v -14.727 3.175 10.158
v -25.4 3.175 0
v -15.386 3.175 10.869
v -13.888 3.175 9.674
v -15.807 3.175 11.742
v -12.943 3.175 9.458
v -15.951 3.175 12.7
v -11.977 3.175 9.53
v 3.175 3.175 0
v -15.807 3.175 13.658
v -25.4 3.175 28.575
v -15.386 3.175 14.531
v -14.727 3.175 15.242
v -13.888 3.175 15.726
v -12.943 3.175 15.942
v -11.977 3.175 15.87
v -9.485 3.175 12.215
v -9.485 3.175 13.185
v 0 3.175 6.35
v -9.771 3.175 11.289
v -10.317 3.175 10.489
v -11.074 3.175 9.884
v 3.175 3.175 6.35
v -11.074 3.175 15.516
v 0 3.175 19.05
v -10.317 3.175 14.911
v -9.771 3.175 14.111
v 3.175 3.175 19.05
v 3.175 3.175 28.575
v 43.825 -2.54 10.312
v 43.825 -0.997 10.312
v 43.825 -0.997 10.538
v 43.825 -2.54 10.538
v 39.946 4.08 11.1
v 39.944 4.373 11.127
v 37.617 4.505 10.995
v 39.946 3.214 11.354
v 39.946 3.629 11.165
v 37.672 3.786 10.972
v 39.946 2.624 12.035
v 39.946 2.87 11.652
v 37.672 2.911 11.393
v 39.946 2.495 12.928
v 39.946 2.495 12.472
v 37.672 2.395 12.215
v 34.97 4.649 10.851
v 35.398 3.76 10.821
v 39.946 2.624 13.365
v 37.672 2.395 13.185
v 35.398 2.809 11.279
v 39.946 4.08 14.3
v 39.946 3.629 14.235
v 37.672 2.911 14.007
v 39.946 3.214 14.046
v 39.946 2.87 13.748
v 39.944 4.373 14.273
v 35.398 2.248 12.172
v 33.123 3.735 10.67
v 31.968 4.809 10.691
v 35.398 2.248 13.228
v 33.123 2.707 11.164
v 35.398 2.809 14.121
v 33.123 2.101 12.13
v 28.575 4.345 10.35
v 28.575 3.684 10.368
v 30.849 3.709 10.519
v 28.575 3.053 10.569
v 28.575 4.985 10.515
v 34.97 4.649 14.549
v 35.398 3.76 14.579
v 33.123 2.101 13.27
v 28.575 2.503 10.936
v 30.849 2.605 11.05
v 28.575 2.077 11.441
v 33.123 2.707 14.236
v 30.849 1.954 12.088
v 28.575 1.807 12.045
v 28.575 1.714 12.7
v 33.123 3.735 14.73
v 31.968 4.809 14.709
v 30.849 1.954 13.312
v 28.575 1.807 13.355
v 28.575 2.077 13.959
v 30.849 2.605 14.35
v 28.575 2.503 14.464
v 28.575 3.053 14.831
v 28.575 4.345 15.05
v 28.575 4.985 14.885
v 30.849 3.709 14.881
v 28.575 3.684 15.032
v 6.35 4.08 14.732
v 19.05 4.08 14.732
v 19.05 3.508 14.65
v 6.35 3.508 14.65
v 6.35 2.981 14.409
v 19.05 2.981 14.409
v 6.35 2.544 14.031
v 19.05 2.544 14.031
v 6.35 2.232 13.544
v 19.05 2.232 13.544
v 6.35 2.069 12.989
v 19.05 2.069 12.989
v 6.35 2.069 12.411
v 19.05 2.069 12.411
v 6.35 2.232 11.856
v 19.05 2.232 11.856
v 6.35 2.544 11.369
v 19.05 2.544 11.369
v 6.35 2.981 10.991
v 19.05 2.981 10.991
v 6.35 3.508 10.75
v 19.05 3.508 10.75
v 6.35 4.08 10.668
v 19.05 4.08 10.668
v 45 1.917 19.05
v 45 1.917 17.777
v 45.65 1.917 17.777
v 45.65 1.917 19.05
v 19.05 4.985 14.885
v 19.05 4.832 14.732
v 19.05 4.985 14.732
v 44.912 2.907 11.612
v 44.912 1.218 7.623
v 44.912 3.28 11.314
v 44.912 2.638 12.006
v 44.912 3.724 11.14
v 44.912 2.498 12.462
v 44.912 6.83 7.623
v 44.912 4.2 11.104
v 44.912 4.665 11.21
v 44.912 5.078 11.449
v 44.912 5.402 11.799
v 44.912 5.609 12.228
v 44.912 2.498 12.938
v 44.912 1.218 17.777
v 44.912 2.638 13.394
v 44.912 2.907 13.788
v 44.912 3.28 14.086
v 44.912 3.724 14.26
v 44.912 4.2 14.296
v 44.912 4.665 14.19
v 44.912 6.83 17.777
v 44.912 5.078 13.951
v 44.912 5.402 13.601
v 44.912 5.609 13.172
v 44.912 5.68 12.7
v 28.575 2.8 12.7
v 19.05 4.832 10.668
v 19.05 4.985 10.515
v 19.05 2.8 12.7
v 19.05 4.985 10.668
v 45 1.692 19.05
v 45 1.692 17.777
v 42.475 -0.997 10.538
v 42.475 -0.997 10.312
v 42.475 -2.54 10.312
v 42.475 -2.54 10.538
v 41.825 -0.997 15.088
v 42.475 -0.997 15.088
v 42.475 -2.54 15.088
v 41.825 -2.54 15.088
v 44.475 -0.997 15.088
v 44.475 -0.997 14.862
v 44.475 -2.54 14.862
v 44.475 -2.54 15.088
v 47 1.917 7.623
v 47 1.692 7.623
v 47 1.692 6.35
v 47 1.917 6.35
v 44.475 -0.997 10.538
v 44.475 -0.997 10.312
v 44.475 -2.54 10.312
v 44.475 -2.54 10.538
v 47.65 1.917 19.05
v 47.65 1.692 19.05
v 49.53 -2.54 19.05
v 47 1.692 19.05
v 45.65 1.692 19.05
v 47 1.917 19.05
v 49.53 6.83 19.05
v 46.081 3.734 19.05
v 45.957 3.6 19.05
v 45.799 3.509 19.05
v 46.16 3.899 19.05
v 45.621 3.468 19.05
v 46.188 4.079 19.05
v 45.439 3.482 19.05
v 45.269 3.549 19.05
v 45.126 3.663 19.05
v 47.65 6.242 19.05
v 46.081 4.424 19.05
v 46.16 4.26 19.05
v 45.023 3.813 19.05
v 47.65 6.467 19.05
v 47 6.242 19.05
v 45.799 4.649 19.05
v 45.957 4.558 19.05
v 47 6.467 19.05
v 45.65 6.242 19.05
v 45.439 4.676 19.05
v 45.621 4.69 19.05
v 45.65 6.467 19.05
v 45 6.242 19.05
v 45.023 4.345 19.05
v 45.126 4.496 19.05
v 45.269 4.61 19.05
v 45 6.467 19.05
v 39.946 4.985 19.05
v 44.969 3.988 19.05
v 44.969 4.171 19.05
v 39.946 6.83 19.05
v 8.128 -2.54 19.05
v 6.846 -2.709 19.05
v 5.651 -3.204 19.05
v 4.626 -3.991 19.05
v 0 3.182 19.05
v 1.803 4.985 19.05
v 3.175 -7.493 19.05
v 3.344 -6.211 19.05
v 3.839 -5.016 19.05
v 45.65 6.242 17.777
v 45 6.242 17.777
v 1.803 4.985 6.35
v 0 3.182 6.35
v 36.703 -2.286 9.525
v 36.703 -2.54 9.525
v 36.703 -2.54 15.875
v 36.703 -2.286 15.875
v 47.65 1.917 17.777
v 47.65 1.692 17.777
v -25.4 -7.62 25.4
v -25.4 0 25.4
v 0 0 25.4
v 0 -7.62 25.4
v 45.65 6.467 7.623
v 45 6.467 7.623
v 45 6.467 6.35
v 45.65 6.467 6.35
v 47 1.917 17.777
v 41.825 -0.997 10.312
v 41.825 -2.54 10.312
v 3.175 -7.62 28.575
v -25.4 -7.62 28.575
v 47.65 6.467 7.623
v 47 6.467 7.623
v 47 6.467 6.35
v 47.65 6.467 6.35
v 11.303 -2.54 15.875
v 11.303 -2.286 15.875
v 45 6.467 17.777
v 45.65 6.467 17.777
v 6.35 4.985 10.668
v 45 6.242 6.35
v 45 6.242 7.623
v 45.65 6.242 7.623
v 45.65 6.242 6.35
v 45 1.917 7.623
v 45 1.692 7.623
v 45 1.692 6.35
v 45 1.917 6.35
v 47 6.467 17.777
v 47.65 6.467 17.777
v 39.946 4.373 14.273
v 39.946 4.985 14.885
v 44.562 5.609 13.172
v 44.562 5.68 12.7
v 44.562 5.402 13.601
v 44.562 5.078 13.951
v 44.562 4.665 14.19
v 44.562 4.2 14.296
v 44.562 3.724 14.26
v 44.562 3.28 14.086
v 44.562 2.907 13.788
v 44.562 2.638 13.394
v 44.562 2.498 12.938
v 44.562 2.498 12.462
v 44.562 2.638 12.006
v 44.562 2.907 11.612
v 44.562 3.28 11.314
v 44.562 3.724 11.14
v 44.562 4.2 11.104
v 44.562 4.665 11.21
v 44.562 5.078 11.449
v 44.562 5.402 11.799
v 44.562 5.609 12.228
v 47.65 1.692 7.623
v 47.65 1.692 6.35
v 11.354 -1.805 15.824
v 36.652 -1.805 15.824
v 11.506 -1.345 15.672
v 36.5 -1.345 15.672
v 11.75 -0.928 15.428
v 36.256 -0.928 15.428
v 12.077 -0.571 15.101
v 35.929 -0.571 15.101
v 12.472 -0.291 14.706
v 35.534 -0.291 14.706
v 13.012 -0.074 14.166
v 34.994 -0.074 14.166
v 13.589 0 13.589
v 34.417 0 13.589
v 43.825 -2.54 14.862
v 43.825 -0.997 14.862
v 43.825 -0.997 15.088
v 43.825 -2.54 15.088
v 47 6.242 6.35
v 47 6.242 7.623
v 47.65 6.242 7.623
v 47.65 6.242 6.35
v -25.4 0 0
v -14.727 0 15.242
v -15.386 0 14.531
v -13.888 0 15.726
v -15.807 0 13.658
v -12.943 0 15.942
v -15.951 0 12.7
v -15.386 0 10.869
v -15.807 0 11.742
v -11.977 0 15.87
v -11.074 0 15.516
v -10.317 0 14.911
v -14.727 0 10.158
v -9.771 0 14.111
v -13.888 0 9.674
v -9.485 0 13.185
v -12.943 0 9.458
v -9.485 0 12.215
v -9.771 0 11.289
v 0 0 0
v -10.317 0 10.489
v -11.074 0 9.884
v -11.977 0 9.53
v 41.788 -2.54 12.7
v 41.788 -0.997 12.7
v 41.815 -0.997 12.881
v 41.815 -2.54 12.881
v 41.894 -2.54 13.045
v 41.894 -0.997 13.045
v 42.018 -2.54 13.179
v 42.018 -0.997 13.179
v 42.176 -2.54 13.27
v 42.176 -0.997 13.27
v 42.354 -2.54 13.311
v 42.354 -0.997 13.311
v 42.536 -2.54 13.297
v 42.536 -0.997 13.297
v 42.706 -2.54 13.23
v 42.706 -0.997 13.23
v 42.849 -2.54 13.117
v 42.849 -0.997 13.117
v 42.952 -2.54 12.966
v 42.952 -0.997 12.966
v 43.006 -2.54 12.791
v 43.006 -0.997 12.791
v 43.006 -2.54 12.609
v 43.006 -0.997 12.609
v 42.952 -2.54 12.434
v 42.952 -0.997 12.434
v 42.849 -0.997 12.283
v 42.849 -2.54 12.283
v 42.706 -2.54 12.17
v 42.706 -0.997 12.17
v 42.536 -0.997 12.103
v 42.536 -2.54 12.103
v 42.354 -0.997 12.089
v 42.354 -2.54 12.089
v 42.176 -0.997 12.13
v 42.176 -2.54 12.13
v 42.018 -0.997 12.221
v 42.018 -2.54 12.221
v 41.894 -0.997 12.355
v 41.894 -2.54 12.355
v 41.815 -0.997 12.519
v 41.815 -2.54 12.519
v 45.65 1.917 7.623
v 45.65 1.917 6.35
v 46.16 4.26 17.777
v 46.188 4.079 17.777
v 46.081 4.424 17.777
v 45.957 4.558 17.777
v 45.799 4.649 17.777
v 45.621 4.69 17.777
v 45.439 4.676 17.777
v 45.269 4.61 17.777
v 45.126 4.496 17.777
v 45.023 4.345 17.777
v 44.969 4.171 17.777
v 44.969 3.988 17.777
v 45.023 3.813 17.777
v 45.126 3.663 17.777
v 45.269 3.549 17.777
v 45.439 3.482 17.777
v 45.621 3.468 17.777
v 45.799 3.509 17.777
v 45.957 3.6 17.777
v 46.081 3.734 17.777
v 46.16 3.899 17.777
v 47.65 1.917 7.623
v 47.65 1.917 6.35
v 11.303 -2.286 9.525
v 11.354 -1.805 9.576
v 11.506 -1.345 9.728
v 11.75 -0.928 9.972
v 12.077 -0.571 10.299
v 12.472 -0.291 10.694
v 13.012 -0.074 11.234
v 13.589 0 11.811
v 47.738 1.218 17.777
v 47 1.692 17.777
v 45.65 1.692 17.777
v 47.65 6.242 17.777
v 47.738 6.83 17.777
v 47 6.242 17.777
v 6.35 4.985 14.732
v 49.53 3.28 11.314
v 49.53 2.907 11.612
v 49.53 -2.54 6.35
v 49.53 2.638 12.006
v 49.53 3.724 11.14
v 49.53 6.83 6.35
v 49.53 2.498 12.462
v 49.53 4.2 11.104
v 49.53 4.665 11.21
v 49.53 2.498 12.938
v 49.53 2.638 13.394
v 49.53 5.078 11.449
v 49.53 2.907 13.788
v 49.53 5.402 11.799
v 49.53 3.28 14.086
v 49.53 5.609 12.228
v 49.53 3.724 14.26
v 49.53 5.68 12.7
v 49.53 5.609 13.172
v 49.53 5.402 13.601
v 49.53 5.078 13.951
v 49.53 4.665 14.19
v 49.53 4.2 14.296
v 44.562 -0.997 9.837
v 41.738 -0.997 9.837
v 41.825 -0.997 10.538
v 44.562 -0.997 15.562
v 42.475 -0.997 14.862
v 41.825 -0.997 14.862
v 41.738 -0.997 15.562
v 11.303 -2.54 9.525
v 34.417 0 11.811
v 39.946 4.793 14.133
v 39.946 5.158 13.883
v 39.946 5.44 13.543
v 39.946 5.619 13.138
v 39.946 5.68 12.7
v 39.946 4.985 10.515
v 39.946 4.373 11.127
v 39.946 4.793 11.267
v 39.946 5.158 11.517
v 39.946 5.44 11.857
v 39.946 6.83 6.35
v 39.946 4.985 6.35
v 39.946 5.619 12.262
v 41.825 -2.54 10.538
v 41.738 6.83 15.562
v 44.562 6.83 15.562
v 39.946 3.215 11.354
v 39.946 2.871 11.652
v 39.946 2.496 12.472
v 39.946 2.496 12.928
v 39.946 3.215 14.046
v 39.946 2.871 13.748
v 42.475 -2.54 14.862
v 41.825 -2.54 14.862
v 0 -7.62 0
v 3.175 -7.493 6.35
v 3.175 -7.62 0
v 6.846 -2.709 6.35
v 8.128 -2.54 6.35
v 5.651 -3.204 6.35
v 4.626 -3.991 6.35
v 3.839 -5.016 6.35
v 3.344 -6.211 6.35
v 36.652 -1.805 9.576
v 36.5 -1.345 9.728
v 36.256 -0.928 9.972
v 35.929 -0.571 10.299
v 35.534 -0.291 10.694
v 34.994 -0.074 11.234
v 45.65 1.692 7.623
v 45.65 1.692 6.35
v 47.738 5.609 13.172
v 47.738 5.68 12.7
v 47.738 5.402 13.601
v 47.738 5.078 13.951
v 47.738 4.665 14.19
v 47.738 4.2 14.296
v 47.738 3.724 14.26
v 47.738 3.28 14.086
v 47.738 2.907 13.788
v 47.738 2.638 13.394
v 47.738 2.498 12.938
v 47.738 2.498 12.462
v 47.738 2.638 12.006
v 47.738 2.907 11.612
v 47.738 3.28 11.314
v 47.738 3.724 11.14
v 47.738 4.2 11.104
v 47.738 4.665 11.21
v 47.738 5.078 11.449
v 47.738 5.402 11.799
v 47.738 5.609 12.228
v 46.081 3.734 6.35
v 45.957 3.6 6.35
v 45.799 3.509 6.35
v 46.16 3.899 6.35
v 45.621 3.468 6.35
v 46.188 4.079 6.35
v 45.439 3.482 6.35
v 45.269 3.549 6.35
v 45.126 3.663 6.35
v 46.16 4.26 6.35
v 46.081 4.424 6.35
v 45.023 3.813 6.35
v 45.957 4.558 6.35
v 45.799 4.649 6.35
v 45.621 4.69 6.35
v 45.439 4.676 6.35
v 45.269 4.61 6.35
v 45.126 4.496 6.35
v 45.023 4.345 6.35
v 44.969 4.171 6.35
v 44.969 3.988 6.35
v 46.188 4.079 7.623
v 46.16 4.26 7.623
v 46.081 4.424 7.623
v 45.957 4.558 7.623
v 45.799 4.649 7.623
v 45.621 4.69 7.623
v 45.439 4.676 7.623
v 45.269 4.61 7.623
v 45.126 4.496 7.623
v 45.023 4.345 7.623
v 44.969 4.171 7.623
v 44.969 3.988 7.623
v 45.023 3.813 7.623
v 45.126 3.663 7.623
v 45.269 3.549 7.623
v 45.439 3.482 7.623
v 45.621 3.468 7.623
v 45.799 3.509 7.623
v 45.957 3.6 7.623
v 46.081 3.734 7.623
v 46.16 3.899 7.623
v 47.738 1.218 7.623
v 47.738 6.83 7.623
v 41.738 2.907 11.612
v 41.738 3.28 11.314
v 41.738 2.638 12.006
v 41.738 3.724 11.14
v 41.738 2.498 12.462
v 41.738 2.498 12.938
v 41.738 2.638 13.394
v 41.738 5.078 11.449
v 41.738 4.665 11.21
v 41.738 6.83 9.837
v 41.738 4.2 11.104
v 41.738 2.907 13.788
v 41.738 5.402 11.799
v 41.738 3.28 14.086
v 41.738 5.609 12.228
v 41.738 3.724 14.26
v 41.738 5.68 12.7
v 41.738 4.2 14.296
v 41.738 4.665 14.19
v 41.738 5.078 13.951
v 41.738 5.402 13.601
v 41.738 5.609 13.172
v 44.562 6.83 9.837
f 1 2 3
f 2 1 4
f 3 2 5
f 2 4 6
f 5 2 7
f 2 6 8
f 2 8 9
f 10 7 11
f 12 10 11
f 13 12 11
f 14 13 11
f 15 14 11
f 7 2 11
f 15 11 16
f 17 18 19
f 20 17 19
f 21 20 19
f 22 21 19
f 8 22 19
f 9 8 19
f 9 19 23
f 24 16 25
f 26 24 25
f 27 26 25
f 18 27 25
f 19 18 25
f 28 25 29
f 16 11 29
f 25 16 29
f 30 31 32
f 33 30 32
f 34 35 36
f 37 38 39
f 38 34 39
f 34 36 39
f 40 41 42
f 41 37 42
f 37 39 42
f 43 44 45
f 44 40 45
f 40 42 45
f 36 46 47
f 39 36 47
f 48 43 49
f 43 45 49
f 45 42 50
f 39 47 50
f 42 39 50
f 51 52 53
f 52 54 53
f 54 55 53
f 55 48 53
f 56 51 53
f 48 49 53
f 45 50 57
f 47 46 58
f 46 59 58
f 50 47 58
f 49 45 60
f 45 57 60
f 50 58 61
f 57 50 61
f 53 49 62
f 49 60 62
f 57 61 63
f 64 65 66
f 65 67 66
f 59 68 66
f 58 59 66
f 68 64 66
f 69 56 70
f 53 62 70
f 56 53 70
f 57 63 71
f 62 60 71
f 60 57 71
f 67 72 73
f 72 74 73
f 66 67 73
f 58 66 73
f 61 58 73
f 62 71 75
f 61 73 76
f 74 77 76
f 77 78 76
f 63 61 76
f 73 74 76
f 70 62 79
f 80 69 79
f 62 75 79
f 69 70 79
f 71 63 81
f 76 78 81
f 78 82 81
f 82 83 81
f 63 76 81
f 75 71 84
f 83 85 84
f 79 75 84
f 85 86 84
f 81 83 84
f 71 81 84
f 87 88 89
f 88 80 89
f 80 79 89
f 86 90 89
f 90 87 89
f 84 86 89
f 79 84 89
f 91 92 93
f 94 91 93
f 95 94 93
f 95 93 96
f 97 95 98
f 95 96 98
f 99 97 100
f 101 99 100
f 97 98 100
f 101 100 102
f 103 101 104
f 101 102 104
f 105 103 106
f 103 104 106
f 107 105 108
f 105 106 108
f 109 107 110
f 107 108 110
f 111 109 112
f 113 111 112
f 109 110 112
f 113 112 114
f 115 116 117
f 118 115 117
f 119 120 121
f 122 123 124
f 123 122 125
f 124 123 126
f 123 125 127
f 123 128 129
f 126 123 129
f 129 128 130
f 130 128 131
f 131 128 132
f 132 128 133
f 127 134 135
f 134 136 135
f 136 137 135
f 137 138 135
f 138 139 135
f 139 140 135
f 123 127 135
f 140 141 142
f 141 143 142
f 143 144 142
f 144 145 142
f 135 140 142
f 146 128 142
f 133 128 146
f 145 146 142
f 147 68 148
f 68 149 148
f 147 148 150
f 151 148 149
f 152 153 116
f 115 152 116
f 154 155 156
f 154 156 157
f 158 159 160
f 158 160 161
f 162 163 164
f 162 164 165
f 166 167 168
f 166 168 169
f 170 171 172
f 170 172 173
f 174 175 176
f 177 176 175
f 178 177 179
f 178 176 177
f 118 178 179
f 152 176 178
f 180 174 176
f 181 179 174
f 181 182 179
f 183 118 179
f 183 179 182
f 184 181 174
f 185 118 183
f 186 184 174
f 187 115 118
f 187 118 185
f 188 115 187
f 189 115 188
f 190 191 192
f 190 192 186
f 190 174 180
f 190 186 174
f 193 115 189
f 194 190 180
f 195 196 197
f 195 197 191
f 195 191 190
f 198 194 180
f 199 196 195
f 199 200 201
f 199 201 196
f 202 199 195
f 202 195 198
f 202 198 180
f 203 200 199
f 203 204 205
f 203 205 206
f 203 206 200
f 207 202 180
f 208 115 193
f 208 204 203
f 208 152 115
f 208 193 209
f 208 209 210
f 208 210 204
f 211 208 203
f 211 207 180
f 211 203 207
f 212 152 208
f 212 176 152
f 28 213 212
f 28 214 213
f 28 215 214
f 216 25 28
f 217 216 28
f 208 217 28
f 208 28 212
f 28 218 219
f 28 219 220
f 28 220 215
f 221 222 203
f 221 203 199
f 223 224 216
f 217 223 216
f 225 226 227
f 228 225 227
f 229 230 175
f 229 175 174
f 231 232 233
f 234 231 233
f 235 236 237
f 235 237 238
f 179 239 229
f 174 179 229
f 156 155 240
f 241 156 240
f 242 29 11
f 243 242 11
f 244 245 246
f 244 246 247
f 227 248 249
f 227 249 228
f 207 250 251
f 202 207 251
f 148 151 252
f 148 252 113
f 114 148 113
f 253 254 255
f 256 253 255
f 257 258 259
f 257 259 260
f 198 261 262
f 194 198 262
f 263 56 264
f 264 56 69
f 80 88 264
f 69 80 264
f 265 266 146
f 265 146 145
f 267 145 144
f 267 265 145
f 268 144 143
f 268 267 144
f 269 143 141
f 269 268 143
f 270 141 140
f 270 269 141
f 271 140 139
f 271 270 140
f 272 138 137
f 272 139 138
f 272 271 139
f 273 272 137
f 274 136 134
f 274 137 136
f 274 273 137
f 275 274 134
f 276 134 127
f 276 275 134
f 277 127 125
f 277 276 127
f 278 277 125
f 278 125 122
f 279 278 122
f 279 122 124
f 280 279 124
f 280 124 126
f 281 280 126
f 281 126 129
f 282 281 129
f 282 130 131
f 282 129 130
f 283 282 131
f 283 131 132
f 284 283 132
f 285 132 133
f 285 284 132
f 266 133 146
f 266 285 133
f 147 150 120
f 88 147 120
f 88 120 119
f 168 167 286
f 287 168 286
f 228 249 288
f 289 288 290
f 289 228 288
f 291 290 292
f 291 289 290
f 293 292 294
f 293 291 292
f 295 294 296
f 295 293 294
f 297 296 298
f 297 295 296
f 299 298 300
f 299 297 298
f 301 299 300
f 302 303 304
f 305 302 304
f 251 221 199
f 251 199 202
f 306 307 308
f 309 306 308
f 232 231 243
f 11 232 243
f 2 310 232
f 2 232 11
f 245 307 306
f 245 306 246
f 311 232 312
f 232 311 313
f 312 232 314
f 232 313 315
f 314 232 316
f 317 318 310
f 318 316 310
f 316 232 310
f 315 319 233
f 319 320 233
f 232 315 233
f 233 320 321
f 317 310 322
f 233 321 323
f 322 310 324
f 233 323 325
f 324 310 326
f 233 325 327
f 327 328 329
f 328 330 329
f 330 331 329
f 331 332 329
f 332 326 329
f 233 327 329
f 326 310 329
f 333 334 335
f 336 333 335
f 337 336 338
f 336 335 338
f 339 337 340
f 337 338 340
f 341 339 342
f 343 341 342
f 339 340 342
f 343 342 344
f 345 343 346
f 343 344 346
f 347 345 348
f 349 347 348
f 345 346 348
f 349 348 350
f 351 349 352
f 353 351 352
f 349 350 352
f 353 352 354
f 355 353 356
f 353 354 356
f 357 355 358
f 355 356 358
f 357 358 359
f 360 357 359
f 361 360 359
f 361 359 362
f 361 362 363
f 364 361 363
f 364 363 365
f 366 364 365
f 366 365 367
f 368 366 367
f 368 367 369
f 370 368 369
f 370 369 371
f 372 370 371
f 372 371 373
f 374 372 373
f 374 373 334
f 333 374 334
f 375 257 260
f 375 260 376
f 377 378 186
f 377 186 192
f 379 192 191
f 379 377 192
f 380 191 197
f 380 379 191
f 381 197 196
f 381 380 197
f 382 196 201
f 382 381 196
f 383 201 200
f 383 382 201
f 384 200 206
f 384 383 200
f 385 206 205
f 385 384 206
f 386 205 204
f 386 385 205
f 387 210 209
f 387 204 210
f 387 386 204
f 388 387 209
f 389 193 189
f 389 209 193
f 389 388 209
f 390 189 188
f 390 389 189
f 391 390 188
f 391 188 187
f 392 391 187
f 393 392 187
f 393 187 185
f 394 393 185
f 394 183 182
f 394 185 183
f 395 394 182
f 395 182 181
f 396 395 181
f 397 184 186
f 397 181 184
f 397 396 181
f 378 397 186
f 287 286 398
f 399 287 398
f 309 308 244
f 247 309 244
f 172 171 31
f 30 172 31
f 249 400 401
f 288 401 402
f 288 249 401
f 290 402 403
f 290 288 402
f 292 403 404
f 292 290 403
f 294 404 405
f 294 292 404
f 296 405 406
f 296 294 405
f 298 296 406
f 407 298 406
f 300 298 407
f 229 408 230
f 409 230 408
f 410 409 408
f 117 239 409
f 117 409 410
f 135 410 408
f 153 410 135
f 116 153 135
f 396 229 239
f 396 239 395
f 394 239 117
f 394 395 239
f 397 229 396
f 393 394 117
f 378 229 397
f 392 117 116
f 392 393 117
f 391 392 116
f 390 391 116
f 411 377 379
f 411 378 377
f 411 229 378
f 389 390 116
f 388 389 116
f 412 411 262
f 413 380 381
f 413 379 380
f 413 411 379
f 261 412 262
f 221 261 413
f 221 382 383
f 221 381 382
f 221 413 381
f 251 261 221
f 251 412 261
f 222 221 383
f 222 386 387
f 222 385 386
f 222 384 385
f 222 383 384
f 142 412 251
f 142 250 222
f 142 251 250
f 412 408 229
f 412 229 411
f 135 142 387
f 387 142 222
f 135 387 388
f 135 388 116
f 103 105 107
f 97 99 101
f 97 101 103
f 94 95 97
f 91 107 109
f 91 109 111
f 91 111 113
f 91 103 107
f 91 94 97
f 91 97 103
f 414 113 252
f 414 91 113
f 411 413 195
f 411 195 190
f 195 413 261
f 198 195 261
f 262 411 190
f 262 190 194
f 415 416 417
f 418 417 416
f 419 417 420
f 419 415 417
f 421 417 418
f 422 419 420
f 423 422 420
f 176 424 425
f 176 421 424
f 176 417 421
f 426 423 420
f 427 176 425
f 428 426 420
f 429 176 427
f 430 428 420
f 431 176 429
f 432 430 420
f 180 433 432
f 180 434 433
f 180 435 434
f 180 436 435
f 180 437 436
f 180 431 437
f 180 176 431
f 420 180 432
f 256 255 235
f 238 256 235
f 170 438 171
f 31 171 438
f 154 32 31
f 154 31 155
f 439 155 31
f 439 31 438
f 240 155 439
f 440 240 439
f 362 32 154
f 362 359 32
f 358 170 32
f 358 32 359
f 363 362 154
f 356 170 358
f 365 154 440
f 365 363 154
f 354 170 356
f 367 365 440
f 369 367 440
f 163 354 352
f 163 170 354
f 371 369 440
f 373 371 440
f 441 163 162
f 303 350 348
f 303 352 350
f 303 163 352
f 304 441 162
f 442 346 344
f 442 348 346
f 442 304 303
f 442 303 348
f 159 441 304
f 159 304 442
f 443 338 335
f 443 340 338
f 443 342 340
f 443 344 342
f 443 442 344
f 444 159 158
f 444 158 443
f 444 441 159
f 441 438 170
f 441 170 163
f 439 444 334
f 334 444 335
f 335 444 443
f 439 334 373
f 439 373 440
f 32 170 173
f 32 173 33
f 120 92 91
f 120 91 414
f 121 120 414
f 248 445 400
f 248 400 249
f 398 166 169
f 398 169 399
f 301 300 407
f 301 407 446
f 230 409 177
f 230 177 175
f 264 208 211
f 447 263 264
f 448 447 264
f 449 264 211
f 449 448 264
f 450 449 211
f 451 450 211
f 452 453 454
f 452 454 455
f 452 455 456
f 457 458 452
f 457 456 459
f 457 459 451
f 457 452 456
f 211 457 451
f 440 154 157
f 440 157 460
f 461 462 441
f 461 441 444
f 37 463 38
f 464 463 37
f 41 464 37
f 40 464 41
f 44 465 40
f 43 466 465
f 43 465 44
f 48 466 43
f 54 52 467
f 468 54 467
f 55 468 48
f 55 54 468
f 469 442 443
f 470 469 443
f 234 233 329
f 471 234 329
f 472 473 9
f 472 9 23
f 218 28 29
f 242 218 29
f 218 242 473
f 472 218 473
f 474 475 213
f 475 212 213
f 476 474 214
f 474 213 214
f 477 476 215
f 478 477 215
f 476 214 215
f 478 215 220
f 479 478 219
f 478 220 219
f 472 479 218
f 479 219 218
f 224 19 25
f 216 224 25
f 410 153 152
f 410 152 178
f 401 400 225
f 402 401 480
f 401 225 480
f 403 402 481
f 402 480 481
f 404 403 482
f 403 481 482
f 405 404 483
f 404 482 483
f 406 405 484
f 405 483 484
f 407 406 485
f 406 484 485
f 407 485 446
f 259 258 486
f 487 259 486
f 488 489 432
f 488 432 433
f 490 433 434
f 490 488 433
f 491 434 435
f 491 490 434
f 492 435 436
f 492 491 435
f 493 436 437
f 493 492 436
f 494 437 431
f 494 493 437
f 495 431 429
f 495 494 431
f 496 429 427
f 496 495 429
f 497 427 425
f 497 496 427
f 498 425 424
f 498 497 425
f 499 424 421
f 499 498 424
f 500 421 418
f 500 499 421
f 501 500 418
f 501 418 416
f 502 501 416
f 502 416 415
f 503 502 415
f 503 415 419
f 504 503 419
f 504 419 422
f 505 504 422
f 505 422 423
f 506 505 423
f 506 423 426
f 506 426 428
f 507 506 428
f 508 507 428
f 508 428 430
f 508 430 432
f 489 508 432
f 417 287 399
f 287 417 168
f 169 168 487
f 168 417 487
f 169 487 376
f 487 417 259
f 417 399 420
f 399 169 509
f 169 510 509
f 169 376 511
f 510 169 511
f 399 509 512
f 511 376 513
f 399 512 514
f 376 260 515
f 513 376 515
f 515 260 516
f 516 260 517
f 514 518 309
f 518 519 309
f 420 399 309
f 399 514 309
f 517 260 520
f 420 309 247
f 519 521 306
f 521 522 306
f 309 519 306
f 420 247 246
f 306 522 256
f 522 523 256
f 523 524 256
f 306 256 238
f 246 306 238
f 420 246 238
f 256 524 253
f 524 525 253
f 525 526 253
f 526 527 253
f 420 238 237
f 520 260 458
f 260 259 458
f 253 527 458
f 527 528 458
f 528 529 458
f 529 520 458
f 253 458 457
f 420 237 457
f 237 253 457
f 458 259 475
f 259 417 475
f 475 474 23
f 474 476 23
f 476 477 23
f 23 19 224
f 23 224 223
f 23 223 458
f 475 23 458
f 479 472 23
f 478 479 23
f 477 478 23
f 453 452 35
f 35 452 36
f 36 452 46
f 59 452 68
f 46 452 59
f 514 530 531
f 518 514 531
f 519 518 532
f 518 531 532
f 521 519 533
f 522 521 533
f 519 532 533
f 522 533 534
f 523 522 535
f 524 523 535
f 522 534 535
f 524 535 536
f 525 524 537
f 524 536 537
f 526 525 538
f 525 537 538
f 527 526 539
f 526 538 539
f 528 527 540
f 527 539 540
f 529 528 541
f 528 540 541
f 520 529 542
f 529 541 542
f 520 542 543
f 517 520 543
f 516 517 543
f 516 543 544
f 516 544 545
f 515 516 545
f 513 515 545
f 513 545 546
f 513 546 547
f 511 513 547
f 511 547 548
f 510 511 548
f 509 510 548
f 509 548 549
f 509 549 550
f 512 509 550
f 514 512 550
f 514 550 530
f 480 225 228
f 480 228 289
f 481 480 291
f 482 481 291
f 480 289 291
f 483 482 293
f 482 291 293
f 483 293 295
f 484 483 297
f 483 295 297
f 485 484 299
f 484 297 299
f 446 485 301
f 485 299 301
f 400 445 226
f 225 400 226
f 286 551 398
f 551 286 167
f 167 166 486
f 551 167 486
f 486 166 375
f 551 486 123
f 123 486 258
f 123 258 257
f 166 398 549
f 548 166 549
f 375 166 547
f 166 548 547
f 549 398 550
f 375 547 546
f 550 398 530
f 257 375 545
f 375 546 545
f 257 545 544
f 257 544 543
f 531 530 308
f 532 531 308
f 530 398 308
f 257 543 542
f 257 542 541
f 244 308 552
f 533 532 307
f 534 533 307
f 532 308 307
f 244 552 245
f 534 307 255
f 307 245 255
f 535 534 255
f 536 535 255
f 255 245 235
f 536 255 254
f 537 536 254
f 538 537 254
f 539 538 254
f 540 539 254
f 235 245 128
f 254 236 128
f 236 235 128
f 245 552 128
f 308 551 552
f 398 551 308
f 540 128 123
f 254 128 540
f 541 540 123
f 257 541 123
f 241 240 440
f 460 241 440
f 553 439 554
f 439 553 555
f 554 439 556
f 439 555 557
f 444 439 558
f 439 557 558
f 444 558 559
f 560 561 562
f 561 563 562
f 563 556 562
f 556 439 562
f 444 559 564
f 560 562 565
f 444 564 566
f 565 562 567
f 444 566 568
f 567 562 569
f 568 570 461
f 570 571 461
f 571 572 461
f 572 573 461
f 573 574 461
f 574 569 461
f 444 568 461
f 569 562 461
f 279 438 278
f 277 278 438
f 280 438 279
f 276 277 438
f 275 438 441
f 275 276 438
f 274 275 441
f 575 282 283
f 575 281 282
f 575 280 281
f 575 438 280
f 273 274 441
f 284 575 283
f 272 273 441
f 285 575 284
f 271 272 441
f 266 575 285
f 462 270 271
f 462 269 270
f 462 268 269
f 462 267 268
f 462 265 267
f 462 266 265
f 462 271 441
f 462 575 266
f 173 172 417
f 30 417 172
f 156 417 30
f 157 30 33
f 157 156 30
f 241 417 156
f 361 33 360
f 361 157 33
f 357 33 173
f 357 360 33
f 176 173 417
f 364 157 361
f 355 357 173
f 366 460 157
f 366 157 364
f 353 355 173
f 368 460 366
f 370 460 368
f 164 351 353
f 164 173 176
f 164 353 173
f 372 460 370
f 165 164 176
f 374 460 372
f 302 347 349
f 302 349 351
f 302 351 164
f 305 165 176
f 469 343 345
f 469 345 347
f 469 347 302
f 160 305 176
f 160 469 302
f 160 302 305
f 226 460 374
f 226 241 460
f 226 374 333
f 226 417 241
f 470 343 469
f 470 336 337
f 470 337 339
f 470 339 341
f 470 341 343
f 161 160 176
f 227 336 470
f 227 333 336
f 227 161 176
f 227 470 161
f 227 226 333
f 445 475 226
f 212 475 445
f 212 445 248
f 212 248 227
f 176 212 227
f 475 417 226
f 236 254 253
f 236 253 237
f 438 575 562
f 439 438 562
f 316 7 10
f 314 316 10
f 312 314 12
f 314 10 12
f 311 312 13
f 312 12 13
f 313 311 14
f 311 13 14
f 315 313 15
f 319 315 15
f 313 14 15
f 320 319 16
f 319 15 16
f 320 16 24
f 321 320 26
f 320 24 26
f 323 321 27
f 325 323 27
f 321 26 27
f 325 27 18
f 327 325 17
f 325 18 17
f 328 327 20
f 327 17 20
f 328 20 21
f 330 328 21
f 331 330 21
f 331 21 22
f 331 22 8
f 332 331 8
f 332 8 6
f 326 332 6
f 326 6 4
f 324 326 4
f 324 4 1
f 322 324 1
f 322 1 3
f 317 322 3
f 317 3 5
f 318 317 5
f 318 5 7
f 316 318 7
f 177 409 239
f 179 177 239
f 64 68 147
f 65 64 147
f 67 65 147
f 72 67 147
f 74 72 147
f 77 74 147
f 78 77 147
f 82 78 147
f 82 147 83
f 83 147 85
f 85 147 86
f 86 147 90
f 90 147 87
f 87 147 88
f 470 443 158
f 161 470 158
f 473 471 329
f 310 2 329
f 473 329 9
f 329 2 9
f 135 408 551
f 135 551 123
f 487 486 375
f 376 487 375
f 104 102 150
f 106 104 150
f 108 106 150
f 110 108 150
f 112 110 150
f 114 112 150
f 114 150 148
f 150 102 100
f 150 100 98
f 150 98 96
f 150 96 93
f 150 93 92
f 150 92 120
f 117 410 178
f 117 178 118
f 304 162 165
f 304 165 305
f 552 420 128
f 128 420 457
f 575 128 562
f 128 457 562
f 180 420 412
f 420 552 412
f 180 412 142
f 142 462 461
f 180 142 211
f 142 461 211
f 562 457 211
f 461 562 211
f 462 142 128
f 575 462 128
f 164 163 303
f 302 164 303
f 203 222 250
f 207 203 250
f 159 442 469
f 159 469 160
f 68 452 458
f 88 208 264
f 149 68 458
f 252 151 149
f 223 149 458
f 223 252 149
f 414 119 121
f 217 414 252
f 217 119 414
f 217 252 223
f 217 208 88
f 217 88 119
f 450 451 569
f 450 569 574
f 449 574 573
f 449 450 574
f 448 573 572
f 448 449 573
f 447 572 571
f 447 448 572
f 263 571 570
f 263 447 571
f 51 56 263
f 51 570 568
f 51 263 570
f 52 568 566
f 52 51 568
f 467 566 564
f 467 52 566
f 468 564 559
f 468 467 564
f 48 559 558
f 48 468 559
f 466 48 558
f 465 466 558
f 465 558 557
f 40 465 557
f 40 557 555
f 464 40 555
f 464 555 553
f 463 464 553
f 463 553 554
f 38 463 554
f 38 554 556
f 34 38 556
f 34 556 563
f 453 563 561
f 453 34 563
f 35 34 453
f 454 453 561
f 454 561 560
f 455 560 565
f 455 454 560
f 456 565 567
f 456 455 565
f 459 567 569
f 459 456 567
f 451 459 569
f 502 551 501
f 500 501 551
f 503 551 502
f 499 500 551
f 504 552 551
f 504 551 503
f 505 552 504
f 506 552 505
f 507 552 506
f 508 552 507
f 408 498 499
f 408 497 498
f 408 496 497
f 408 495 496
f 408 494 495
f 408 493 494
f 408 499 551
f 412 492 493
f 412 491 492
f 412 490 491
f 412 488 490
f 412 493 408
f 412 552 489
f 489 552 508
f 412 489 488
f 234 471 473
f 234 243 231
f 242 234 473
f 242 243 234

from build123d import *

# Parameters (mm, degrees)
SKETCH_W             = 25.4
SKETCH_H             = 3.175
PAD_DEPTH            = 25.4
SKETCH001_W          = 28.575
SKETCH001_H          = 12.7
PAD001_DEPTH         = 1.81
PAD001_DEPTH_BACK    = 5.715
POCKET_DEPTH         = 9.525
POCKET001_DEPTH      = 12.7
CHAMFER_SIZE         = 1.8034
SKETCH004_R          = 3.2512
POCKET002_DEPTH      = 5.716
PAD002_DEPTH         = 10.795
FILLET_R             = 4.953
SKETCH013_W          = 9.37
SKETCH013_H          = 12.7
SKETCH013_R          = 1.6002
PAD008_DEPTH         = 20.955
POCKET003_DEPTH      = 11.3711
SKETCH014_W          = 2.825
SKETCH014_H          = 10.1538
POCKET004_DEPTH      = 5.6125
SKETCH015_W          = 2.825
SKETCH015_H          = 5.725
POCKET005_DEPTH      = 7.8269
SKETCH016_R          = 0.6125
SKETCH016_W          = 0.65
SKETCH016_H          = 0.225
POCKET006_DEPTH      = 6.6241
SKETCH017_R          = 0.6125
SKETCH017_W          = 0.65
SKETCH017_H          = 0.225
POCKET007_DEPTH      = 7.6241
POCKET007_DEPTH_BACK = 20.9529
SKETCH018_R          = 1.6002
SKETCH019_R          = 2.36517
SKETCH020_W          = 25.4
SKETCH020_H          = 6.35
POCKET008_DEPTH      = 2.54
FILLET001_R          = 2.286


with BuildPart() as part:
    # Sketch → Pad (new body)
    with BuildSketch(Plane.XY):
        with Locations((-12.7, 1.5875)):
            Rectangle(SKETCH_W, SKETCH_H)
    extrude(amount=PAD_DEPTH)

    # Sketch001 (on Face1 of Pad) → Pad001 (join, two sides)
    with BuildSketch(Plane(origin=(0, 3.175, 0), x_dir=(-1, 0, 0), z_dir=(0, 1, 0))) as pad001_sk:
        with Locations((-14.2875, 12.7)):
            Rectangle(SKETCH001_W, SKETCH001_H)
    extrude(amount=PAD001_DEPTH)
    extrude(pad001_sk.sketch, amount=-PAD001_DEPTH_BACK)

    # Sketch002 (on Face13 of Pad001) → Pocket (cut)
    with BuildSketch(Plane.YZ.offset(28.575)):
        Polygon((9.150137, 19.05), (2.800137, 12.7), (9.150137, 6.35), align=None)
    extrude(amount=-POCKET_DEPTH, mode=Mode.SUBTRACT)

    # Sketch003 (on Face16 of Pocket) → Pocket001 (cut)
    with BuildSketch(Plane.YZ.offset(19.05)):
        with BuildLine():
            ThreePointArc((4.08, 14.732), (2.048, 12.7), (4.08, 10.668))
            Line((4.985, 10.668), (4.08, 10.668))
            Line((4.985, 14.732), (4.985, 10.668))
            Line((4.08, 14.732), (4.985, 14.732))
        make_face()
    extrude(amount=-POCKET001_DEPTH, mode=Mode.SUBTRACT)

    # Chamfer
    chamfer_edges = [part.edges().sort_by_distance(p)[0] for p in [
        (0, 4.985, 12.7),
    ]]
    chamfer(chamfer_edges, length=CHAMFER_SIZE)

    # Sketch004 (on Face4 of Chamfer) → Pocket002 (cut, through all)
    with BuildSketch(Plane(origin=(0, 3.175, 0), x_dir=(-1, 0, 0), z_dir=(0, 1, 0))):
        with Locations((12.7, 12.7)):
            Circle(SKETCH004_R)
    extrude(amount=-POCKET002_DEPTH, mode=Mode.SUBTRACT)

    # Sketch006 (on Face4 of Pocket002) → Pad002 (join)
    with BuildSketch(Plane(origin=(0, 3.175, 0), x_dir=(-1, 0, 0), z_dir=(0, 1, 0))):
        Polygon((0, 0), (-3.175, 0), (-3.175, 28.575), (25.4, 28.575), (25.4, 25.4), (0, 25.4), align=None)
    extrude(amount=-PAD002_DEPTH)

    # Fillet
    fillet_edges = [part.edges().sort_by_distance(p)[0] for p in [
        (3.175, -2.54, 12.7),
    ]]
    fillet(fillet_edges, radius=FILLET_R)

    # Sketch013 (on Face4 of Fillet) → Pad008 (join)
    with BuildSketch(Plane.YZ.offset(28.575)):
        with Locations((2.145, 12.7)):
            Rectangle(SKETCH013_W, SKETCH013_H)
        with Locations((4.08, 12.7)):
            Circle(SKETCH013_R, mode=Mode.SUBTRACT)
    extrude(amount=PAD008_DEPTH)

    # Pad008 Face13 → Pocket003 (cut)
    with BuildSketch(Plane(origin=(28.575, 5.919165, 12.7), x_dir=(0, 1, 0), z_dir=(-1, 0, 0))):
        with BuildLine():
            Line((-0.934165, -2.184863), (-0.934165, -6.35))
            Line((-0.934165, -6.35), (0.910835, -6.35))
            Line((0.910835, -6.35), (0.910835, 6.35))
            Line((0.910835, 6.35), (-0.934165, 6.35))
            Line((-0.934165, 6.35), (-0.934165, 2.184863))
            Line((-0.934165, 2.184863), (-1.545926, 1.573102))
            ThreePointArc((-1.545926, 1.573102), (-0.608336, 1.022594), (-0.238965, 0))
            ThreePointArc((-0.238965, 0), (-0.608336, -1.022594), (-1.545926, -1.573102))
            Line((-1.545926, -1.573102), (-0.934165, -2.184863))
        make_face()
    extrude(amount=-POCKET003_DEPTH, mode=Mode.SUBTRACT)

    # Sketch014 (on Face15 of Pocket003) → Pocket004 (cut)
    with BuildSketch(Plane(origin=(0, 6.83, 0), x_dir=(-1, 0, 0), z_dir=(0, 1, 0))):
        with Locations((-46.325, 12.7)):
            Rectangle(SKETCH014_W, SKETCH014_H)
    extrude(amount=-POCKET004_DEPTH, mode=Mode.SUBTRACT)

    # Sketch015 (on Face15 of Pocket004) → Pocket005 (cut)
    with BuildSketch(Plane(origin=(0, 6.83, 0), x_dir=(-1, 0, 0), z_dir=(0, 1, 0))):
        with Locations((-43.15, 12.7)):
            Rectangle(SKETCH015_W, SKETCH015_H)
    extrude(amount=-POCKET005_DEPTH, mode=Mode.SUBTRACT)

    # Sketch016 (on Face53 of Pocket005) → Pocket006 (cut, through all)
    with BuildSketch(Plane(origin=(0, -0.9969, 0), x_dir=(-1, 0, 0), z_dir=(0, 1, 0))):
        with Locations((-42.4, 12.7)):
            Circle(SKETCH016_R)
        with Locations((-44.15, 14.975)):
            Rectangle(SKETCH016_W, SKETCH016_H)
        with Locations((-44.15, 10.425)):
            Rectangle(SKETCH016_W, SKETCH016_H)
        with Locations((-42.15, 14.975)):
            Rectangle(SKETCH016_W, SKETCH016_H)
        with Locations((-42.15, 10.425)):
            Rectangle(SKETCH016_W, SKETCH016_H)
    extrude(amount=-POCKET006_DEPTH, mode=Mode.SUBTRACT)

    # Sketch017 (on Face52 of Pocket006) → Pocket007 (cut, two sides)
    with BuildSketch(Plane.XY.offset(7.6231)) as pocket007_sk:
        with Locations((45.575, 4.07924)):
            Circle(SKETCH017_R)
        with Locations((45.325, 6.35424)):
            Rectangle(SKETCH017_W, SKETCH017_H)
        with Locations((45.325, 1.80424)):
            Rectangle(SKETCH017_W, SKETCH017_H)
        with Locations((47.325, 6.35424)):
            Rectangle(SKETCH017_W, SKETCH017_H)
        with Locations((47.325, 1.80424)):
            Rectangle(SKETCH017_W, SKETCH017_H)
    extrude(amount=-POCKET007_DEPTH, mode=Mode.SUBTRACT)
    extrude(pocket007_sk.sketch, amount=POCKET007_DEPTH_BACK, mode=Mode.SUBTRACT)

    # Sketch018 (on Face12 of Pocket007) → SubtractiveLoft section 0
    with BuildSketch(Plane(origin=(39.9461, 0, 0), x_dir=(0, -1, 0), z_dir=(-1, 0, 0))):
        with Locations((-4.07924, 12.7)):
            Circle(SKETCH018_R)
    # Sketch019 (on Face80 of Pocket007) → SubtractiveLoft section 1
    with BuildSketch(Plane.YZ.offset(28.575)):
        with Locations((4.07924, 12.7)):
            Circle(SKETCH019_R)
    loft(mode=Mode.SUBTRACT)

    # Sketch020 (on Face2 of SubtractiveLoft) → Pocket008 (cut)
    with BuildSketch(Plane.XZ.offset(2.54)):
        with Locations((24.003, 12.7)):
            Rectangle(SKETCH020_W, SKETCH020_H)
    extrude(amount=-POCKET008_DEPTH, mode=Mode.SUBTRACT)

    # Fillet001
    fillet001_edges = [part.edges().sort_by_distance(p)[0] for p in [
        (24.003, 0, 15.875),
        (36.703, 0, 12.7),
        (24.003, 0, 9.525),
        (11.303, 0, 12.7),
    ]]
    fillet(fillet001_edges, radius=FILLET001_R)


solid = part.part
